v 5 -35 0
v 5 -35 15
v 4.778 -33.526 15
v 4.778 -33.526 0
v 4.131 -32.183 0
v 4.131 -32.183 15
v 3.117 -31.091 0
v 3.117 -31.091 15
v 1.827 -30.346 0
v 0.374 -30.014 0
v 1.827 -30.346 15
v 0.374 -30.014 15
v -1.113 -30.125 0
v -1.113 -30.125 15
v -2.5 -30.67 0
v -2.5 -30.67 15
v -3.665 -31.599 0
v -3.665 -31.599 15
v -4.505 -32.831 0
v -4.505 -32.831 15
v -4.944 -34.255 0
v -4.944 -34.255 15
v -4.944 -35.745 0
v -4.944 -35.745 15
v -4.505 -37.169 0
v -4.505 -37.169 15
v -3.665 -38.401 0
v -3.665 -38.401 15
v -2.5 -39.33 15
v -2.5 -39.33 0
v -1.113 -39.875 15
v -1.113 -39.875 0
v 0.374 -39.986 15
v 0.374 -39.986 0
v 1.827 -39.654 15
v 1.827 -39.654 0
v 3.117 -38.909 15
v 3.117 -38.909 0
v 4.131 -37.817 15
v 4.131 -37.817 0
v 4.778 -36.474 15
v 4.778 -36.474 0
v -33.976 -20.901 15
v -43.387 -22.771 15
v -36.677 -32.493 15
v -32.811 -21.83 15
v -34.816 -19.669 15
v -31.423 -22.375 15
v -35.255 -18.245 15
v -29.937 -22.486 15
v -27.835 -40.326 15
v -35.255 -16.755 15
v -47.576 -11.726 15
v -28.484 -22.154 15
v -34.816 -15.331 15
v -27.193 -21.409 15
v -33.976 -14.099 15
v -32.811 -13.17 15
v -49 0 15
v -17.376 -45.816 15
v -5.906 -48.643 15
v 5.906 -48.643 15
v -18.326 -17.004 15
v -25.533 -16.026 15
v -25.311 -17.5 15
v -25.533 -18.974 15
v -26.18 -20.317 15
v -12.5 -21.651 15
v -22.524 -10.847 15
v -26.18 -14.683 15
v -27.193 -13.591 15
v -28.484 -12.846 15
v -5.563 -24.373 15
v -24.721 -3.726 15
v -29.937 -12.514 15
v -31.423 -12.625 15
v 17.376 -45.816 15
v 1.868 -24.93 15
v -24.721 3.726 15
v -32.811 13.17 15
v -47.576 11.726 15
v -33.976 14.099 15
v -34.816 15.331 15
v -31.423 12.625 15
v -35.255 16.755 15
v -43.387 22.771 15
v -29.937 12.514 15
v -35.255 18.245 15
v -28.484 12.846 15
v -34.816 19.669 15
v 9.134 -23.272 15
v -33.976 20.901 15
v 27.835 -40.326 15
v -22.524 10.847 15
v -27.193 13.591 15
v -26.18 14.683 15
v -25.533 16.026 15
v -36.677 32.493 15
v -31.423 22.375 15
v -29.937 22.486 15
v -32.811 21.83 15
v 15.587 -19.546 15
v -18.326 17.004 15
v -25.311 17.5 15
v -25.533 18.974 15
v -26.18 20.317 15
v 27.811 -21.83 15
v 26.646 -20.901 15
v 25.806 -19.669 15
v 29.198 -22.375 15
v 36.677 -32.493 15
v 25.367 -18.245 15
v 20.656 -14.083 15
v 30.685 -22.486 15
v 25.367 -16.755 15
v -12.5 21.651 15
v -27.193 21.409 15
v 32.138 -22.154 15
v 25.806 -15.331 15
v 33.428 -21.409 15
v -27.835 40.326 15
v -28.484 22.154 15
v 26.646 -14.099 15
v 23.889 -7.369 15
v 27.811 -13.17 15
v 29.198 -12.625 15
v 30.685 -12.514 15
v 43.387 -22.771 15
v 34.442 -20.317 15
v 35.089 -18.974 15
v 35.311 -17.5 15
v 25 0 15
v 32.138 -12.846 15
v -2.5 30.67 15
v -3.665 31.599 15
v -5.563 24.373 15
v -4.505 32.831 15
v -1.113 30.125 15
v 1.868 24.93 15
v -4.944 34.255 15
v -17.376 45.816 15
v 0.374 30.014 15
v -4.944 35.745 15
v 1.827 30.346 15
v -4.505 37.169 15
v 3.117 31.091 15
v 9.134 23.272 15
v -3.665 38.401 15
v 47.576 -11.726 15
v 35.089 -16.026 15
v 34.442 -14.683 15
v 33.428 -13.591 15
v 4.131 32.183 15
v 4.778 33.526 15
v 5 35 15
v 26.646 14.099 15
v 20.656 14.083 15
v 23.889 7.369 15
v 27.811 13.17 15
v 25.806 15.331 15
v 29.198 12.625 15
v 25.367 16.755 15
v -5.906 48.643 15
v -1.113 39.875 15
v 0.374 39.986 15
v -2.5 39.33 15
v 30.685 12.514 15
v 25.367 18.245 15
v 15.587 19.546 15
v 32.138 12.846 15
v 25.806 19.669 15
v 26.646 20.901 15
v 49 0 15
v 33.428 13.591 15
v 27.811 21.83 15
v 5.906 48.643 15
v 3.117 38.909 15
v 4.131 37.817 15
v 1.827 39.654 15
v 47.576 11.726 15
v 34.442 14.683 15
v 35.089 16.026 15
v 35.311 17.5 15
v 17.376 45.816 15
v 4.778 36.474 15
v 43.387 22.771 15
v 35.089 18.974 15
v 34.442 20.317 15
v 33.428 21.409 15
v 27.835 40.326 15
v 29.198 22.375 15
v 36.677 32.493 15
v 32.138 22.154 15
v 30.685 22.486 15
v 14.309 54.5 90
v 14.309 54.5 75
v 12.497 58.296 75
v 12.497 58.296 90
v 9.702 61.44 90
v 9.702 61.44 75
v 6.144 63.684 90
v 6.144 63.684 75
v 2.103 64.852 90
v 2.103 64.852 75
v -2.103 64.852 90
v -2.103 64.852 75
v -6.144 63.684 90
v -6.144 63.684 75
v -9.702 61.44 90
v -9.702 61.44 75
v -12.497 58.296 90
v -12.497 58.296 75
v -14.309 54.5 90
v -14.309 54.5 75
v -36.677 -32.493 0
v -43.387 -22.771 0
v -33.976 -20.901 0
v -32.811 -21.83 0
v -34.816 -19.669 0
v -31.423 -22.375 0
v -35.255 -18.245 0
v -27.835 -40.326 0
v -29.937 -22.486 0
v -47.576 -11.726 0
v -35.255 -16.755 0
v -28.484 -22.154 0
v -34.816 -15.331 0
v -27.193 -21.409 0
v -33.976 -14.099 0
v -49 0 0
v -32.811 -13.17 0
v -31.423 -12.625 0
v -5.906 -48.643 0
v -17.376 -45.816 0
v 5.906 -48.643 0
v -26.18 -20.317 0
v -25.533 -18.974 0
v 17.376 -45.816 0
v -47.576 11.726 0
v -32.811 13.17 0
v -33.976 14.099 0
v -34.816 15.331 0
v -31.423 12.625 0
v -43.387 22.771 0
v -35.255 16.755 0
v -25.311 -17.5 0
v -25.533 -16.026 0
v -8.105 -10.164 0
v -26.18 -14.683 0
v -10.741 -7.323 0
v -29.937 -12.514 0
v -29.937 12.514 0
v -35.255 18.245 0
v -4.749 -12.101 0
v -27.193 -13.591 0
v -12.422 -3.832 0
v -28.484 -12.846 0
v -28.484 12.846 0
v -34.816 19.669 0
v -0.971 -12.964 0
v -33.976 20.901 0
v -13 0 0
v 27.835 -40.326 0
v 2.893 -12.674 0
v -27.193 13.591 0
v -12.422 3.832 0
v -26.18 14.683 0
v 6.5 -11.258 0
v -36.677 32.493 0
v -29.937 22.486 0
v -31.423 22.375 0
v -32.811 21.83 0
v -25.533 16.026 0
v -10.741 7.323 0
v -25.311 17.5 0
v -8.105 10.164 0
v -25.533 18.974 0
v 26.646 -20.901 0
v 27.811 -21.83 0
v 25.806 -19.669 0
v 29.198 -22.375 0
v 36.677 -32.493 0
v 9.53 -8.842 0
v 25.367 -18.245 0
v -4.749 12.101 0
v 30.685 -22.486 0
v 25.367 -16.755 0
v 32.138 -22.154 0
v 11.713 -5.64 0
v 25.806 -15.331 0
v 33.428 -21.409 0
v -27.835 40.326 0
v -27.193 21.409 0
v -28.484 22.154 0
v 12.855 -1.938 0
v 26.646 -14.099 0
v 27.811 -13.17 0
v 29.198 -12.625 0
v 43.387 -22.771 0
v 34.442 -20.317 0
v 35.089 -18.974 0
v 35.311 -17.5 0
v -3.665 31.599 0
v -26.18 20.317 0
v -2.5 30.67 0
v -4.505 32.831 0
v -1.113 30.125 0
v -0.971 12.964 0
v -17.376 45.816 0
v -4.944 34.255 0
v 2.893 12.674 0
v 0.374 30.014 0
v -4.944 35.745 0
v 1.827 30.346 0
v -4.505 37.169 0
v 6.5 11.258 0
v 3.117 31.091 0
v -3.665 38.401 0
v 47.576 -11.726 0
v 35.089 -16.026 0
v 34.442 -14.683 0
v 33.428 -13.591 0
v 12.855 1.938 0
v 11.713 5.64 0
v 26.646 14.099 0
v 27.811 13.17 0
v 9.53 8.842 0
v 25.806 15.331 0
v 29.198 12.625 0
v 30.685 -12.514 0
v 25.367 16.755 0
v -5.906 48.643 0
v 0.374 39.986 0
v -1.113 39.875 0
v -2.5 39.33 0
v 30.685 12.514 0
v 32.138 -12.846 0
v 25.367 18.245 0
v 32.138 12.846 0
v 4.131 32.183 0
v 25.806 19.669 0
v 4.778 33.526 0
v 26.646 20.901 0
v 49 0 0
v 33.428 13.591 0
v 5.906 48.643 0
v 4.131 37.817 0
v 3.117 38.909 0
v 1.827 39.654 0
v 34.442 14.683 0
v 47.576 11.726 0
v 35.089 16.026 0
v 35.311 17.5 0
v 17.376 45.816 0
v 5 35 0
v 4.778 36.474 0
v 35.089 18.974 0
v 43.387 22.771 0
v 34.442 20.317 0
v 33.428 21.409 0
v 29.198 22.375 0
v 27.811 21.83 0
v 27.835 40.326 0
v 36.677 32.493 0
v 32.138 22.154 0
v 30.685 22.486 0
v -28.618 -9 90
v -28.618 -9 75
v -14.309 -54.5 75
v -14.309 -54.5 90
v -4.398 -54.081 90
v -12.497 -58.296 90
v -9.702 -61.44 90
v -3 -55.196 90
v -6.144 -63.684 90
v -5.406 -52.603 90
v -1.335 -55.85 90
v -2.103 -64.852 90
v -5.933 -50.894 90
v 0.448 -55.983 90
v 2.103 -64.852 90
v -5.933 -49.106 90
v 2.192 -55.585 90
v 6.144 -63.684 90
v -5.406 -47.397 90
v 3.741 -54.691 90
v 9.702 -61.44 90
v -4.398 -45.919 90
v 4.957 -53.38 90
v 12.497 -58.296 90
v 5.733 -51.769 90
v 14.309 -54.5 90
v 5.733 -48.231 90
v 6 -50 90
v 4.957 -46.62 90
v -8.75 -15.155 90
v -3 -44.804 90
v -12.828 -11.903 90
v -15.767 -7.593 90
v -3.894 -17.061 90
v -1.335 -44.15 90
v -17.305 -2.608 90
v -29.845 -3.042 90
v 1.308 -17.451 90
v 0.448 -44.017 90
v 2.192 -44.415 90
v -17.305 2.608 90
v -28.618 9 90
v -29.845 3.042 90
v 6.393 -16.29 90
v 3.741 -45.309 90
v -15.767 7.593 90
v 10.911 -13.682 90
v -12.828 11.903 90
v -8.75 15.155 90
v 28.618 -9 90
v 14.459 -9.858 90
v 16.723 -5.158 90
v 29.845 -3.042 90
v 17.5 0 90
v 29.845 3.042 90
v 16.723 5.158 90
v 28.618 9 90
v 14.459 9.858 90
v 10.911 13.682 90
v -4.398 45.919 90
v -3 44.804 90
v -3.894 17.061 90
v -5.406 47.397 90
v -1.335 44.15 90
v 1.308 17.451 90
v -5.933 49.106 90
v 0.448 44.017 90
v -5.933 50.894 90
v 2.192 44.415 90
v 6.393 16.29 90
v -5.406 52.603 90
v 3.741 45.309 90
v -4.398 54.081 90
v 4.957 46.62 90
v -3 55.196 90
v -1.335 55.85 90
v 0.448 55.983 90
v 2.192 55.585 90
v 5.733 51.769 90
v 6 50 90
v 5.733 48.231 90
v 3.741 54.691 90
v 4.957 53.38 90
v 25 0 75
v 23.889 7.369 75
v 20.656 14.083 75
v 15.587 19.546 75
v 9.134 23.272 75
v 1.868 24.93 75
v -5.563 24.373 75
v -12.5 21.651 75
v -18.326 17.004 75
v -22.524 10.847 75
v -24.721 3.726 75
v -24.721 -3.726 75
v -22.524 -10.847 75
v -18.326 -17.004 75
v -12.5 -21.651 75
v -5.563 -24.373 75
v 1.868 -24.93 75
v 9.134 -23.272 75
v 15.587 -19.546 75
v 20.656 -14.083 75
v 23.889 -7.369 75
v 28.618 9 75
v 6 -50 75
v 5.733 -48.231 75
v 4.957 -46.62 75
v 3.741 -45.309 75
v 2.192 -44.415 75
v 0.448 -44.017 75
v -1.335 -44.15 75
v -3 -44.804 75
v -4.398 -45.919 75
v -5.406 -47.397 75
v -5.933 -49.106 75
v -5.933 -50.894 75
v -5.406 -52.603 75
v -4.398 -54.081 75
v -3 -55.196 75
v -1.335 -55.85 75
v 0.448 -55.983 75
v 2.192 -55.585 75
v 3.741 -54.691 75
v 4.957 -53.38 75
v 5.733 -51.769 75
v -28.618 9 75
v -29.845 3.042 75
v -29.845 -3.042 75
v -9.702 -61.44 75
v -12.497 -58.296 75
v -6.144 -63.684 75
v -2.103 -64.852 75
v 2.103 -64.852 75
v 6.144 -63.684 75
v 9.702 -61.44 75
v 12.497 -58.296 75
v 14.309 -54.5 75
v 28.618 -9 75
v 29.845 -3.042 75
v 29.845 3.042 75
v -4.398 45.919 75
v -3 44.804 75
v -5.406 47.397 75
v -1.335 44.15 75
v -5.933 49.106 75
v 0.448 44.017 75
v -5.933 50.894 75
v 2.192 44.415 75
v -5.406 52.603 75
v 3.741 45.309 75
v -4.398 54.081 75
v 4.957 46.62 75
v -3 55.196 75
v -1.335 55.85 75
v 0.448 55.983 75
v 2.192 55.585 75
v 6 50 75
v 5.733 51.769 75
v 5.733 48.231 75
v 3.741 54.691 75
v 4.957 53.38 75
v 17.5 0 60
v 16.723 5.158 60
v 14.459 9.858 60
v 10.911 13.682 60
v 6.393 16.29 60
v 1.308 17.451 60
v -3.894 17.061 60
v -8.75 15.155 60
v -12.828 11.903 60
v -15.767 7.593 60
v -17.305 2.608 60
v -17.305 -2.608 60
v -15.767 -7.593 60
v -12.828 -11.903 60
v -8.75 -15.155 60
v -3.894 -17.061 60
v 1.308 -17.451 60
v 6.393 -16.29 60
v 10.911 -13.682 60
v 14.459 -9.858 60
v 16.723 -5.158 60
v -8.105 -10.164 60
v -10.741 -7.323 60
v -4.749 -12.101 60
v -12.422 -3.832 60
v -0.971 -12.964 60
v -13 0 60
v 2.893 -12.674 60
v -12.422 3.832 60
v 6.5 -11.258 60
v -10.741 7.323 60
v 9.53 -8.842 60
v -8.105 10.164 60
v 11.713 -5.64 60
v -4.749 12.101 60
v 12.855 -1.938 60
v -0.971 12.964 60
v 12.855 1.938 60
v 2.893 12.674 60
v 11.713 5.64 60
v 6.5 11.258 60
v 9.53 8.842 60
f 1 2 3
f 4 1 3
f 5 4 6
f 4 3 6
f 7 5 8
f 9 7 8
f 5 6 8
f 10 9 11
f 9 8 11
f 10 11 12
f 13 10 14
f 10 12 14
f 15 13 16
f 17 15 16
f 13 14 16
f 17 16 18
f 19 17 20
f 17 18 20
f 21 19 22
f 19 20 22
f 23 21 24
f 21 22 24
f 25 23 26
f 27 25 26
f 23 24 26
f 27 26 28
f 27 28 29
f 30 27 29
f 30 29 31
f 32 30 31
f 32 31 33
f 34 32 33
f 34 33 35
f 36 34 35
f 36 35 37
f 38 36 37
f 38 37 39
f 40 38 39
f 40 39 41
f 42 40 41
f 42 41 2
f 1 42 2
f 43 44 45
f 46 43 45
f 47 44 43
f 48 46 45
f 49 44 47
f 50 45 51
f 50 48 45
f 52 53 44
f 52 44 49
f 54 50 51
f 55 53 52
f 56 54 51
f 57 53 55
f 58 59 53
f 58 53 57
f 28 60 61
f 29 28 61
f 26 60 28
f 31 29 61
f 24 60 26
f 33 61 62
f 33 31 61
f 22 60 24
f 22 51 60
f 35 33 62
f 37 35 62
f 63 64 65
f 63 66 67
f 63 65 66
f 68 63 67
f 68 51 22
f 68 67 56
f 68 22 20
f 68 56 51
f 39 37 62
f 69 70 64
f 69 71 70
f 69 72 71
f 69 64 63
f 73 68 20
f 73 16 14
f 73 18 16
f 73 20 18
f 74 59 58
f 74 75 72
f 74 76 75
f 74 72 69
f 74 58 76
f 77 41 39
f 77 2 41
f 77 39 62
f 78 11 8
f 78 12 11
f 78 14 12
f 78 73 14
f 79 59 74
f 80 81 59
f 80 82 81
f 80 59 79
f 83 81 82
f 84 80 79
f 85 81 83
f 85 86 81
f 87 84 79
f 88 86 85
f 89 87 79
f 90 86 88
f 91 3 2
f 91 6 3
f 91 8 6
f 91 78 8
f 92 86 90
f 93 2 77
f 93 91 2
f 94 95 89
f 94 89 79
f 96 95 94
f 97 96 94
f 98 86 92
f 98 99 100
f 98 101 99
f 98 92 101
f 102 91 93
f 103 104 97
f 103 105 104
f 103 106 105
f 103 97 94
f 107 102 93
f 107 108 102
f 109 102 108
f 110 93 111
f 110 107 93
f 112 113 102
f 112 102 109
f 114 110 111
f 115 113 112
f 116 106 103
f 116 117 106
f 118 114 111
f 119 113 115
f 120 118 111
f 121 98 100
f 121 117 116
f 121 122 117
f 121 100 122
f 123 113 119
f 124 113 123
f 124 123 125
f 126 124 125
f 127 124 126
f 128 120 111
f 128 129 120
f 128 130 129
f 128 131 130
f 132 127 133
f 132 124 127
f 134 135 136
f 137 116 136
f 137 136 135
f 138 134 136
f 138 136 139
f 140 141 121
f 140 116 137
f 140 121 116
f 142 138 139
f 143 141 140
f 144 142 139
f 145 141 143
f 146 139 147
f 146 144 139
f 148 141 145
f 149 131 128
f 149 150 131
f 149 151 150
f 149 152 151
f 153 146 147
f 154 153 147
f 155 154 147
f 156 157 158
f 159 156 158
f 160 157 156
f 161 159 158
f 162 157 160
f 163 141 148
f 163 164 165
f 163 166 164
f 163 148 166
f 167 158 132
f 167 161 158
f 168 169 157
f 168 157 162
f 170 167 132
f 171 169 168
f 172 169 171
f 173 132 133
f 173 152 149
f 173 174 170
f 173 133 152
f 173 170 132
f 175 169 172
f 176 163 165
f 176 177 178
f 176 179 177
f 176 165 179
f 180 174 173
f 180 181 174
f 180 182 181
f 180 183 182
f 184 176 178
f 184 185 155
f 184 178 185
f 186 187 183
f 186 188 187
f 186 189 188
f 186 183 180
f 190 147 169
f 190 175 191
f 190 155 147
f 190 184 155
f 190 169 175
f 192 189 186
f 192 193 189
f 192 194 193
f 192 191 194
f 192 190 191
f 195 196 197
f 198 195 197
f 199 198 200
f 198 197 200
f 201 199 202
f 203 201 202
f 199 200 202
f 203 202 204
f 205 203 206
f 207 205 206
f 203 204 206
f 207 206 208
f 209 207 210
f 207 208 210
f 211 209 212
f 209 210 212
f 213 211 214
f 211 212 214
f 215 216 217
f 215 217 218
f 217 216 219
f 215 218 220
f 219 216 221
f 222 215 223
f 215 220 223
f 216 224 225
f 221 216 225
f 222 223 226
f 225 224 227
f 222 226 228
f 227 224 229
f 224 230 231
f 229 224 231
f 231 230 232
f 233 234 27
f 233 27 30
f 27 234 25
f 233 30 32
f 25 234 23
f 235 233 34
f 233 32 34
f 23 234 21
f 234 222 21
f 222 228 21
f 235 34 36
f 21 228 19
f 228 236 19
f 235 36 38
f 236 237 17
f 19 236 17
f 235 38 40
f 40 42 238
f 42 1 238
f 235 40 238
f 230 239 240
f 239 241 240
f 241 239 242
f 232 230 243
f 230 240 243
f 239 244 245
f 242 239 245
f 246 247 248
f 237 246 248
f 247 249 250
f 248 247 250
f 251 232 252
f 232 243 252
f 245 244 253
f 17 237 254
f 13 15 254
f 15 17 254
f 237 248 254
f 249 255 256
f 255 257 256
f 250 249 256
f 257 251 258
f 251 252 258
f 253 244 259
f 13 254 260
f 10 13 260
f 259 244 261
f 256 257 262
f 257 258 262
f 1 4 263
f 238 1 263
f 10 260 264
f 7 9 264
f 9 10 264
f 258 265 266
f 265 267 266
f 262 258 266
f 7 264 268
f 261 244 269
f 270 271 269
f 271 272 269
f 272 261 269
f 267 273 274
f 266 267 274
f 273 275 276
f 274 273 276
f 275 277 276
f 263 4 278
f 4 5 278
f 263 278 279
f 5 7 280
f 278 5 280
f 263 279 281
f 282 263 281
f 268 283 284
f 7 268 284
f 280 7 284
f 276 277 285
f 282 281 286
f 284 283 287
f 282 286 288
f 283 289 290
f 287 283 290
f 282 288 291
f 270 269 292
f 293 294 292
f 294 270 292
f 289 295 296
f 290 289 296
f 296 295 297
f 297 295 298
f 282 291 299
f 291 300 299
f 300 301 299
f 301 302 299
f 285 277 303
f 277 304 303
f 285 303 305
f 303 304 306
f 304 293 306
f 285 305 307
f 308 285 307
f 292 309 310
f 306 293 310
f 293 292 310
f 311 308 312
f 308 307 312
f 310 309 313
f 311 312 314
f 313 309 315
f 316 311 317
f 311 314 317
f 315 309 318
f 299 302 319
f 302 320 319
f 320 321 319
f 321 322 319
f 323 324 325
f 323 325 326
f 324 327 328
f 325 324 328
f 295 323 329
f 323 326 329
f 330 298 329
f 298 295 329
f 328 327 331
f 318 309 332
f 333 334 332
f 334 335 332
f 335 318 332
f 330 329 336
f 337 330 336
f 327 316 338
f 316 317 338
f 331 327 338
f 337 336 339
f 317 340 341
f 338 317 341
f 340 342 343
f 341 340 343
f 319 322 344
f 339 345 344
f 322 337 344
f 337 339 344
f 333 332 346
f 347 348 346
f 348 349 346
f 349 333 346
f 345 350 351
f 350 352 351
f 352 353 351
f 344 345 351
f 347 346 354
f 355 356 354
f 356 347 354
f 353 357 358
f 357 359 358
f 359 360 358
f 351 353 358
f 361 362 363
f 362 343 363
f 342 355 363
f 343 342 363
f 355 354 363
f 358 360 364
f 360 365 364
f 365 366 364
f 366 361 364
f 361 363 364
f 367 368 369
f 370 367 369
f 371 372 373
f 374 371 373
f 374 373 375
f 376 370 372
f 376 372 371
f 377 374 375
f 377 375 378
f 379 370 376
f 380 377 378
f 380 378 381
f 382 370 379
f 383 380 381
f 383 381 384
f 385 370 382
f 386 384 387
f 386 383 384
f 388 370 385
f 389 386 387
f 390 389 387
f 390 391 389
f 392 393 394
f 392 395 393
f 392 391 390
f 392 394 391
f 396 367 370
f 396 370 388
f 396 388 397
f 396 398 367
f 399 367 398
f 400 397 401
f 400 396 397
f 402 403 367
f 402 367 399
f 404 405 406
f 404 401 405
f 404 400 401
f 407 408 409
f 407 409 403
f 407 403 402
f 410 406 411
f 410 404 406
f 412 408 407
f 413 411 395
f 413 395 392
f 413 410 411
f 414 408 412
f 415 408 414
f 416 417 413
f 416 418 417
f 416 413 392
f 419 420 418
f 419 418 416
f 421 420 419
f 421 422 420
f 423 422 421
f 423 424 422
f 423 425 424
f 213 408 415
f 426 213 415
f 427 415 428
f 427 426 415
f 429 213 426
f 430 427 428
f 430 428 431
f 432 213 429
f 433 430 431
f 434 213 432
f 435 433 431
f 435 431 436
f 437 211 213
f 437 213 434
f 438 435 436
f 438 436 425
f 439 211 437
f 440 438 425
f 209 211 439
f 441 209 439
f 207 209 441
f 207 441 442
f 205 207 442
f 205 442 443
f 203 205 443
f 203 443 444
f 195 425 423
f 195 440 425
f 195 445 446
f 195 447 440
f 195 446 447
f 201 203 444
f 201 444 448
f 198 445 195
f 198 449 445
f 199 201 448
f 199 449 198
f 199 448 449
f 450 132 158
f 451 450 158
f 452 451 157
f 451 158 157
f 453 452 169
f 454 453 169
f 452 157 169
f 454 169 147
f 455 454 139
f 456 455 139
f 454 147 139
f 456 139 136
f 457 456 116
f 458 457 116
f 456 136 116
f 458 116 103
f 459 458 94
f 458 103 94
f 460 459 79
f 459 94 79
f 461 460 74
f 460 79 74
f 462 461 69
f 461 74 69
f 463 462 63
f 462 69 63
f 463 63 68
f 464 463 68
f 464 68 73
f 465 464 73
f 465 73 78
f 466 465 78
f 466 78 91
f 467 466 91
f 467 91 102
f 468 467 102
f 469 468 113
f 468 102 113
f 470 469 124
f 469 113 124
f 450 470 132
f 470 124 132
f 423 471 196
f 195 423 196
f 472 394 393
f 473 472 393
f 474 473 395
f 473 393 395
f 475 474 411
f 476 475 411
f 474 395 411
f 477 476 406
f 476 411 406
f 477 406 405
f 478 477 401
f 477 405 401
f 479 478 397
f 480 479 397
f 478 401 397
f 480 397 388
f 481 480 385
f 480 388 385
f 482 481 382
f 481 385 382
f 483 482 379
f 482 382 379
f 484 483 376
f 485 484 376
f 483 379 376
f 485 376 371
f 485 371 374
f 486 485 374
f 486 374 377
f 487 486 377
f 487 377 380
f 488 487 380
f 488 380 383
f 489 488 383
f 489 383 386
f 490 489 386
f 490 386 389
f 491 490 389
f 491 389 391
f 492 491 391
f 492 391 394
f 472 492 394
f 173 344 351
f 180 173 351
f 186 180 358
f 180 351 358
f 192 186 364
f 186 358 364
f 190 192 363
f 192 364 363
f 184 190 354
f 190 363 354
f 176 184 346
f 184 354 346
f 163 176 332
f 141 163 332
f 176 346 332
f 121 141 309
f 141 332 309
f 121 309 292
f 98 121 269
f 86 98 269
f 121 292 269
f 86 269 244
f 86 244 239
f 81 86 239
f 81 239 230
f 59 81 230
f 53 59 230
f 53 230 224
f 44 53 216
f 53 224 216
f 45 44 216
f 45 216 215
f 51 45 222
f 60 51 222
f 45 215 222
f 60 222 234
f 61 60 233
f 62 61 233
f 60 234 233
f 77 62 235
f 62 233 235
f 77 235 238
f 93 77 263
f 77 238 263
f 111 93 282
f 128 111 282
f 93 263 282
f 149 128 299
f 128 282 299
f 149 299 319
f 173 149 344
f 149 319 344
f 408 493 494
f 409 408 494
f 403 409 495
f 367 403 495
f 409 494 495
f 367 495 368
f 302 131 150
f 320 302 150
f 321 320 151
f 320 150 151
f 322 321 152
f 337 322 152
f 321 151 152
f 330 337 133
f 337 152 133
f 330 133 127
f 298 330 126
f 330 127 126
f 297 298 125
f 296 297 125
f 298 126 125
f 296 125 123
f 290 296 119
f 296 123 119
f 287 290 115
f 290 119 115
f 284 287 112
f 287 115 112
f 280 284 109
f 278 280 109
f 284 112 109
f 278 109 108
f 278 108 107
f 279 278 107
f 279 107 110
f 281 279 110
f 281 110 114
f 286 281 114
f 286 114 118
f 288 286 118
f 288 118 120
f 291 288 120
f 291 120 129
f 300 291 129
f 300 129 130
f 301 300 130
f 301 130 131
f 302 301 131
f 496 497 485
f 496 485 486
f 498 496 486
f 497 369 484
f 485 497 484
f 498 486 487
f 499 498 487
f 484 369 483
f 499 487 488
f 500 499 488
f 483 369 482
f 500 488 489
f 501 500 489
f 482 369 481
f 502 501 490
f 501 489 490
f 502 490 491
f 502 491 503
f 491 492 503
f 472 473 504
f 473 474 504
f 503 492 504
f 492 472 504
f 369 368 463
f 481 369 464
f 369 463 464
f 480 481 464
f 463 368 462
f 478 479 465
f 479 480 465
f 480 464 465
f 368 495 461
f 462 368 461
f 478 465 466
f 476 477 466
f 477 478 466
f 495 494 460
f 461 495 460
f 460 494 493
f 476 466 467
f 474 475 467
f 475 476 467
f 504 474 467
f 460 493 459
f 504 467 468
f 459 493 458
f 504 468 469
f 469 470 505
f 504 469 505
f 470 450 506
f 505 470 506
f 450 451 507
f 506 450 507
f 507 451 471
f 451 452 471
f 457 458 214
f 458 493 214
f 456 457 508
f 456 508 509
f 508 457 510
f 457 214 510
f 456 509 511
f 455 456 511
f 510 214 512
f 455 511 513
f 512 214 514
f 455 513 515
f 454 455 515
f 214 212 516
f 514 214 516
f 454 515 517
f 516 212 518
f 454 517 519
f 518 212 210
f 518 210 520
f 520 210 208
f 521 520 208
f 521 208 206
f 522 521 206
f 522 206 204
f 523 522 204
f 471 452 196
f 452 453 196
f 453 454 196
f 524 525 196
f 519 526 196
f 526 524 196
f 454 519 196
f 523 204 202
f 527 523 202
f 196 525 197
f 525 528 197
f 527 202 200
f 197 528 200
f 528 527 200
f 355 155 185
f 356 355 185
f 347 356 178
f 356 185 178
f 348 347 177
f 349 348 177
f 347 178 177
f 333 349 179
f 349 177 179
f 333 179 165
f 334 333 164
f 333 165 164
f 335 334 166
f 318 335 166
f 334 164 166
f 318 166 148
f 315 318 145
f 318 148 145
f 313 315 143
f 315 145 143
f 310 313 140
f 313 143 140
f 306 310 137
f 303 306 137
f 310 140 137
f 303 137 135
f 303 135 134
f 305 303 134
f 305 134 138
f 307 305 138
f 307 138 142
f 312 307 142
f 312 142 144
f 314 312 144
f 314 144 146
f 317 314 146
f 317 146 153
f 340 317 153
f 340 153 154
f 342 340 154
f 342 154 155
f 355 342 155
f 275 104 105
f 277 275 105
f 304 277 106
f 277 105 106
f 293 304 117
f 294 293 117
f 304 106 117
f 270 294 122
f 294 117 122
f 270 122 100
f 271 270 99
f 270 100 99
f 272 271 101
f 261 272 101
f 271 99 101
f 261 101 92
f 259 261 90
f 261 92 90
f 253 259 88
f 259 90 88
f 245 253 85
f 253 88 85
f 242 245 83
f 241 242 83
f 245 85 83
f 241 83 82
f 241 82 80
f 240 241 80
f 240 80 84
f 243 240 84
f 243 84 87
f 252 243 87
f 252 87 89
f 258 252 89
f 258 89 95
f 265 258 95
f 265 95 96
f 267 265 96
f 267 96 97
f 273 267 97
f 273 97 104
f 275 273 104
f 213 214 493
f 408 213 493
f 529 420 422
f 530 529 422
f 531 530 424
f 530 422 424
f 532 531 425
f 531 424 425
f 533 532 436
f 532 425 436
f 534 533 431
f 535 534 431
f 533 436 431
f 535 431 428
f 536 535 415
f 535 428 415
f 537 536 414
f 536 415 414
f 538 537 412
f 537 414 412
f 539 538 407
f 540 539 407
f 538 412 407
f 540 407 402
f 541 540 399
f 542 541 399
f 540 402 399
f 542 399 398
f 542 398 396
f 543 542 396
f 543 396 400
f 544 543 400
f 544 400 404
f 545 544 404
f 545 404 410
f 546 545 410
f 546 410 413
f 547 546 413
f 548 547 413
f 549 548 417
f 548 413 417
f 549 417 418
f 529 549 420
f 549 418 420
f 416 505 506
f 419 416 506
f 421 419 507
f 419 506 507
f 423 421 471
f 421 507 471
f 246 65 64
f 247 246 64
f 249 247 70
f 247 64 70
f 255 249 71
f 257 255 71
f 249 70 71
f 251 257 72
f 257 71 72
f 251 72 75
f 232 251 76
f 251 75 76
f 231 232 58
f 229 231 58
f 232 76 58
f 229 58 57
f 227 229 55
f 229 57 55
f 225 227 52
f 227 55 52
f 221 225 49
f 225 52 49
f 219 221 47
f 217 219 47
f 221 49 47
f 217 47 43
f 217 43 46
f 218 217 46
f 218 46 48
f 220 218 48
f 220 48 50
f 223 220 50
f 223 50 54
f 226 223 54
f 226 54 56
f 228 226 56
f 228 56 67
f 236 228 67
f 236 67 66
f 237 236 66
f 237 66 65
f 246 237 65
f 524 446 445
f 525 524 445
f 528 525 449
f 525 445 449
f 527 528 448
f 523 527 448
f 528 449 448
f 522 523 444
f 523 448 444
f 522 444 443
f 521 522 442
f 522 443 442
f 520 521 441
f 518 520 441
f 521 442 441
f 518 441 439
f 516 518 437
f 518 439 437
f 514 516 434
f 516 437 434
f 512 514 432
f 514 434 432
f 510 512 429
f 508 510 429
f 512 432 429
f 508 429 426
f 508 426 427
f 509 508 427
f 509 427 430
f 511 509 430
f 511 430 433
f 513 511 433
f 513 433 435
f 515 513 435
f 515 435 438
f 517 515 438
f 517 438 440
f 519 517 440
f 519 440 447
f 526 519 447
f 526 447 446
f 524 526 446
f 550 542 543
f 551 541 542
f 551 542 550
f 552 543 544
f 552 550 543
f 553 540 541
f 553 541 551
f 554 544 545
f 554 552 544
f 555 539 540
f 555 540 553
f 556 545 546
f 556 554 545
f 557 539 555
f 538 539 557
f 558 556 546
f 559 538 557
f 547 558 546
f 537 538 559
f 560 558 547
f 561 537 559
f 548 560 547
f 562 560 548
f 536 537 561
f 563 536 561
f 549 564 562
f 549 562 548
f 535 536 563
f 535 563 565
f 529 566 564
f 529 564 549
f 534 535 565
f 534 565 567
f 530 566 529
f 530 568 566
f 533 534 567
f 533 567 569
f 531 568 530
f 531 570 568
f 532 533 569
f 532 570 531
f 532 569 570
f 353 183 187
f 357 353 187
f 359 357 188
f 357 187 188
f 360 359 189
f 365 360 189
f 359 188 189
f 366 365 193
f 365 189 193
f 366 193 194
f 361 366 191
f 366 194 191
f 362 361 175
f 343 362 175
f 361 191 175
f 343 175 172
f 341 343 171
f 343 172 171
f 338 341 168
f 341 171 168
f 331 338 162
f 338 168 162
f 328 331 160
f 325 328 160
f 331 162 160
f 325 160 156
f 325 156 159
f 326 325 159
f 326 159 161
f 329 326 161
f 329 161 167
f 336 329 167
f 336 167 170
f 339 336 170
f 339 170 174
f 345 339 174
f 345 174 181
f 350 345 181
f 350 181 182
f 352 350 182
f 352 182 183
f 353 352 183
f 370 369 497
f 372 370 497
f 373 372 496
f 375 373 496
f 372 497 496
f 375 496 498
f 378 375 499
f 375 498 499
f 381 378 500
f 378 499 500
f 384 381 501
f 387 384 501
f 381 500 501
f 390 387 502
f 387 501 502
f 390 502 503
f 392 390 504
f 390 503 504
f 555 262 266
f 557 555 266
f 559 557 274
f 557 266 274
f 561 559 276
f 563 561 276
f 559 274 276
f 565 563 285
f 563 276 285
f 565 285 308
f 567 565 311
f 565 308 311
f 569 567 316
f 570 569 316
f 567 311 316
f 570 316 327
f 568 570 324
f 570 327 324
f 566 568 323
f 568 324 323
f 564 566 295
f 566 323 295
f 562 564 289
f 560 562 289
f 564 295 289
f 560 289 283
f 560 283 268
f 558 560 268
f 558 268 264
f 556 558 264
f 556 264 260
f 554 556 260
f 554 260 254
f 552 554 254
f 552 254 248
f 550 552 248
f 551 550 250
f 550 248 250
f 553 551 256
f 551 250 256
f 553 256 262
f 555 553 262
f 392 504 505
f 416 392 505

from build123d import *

# Parameters (mm, degrees)
SKETCH1_R           = 49
BOSS_EXTRUDE1_DEPTH = 15
SKETCH7_R           = 5
CUT_EXTRUDE1_DEPTH  = 71.901339903
SKETCH8_R           = 25
BOSS_EXTRUDE2_DEPTH = 60
BOSS_EXTRUDE3_DEPTH = 15
SKETCH11_R          = 6
CUT_EXTRUDE3_DEPTH  = 33
SKETCH11_3_R        = 6
SKETCH11_3_R_2      = 17.5
CUT_EXTRUDE4_DEPTH  = 30
SKETCH12_R          = 13
CUT_EXTRUDE5_DEPTH  = 60


with BuildPart() as part:
    # Sketch1 → Boss-Extrude1 (new body)
    with BuildSketch(Plane.XY):
        Circle(SKETCH1_R)
    extrude(amount=BOSS_EXTRUDE1_DEPTH)

    # Sketch7 → Cut-Extrude1 (cut, through all)
    with BuildSketch(Plane.XY.offset(15)):
        with Locations((0, 35)):
            Circle(SKETCH7_R)
        with Locations((30.310889132, 17.5)):
            Circle(SKETCH7_R)
        with Locations((30.310889132, -17.5)):
            Circle(SKETCH7_R)
        with Locations((0, -35)):
            Circle(SKETCH7_R)
        with Locations((-30.310889132, -17.5)):
            Circle(SKETCH7_R)
        with Locations((-30.310889132, 17.5)):
            Circle(SKETCH7_R)
    extrude(amount=-CUT_EXTRUDE1_DEPTH, mode=Mode.SUBTRACT)

    # Sketch8 → Boss-Extrude2 (add)
    with BuildSketch(Plane.XY.offset(15)):
        Circle(SKETCH8_R)
    extrude(amount=BOSS_EXTRUDE2_DEPTH)

    # Sketch10 → Boss-Extrude3 (add)
    with BuildSketch(Plane.XY.offset(75)):
        with BuildLine():
            Line((14.309088021, -54.5), (28.618175991, -9.000000163))
            ThreePointArc((28.618175991, -9.000000163), (30, -8.5e-08), (28.618176043, 9))
            Line((28.618176043, 9), (14.309088021, 54.5))
            ThreePointArc((14.309088021, 54.5), (0, 65), (-14.309088021, 54.5))
            Line((-14.309088021, 54.5), (-28.618176043, 9))
            ThreePointArc((-28.618176043, 9), (-30, 0), (-28.618176043, -9))
            Line((-28.618176043, -9), (-14.309088021, -54.5))
            ThreePointArc((-14.309088021, -54.5), (0, -65), (14.309088021, -54.5))
        make_face()
    extrude(amount=BOSS_EXTRUDE3_DEPTH)

    # Sketch11 → Cut-Extrude3 (cut)
    with BuildSketch(Plane.XY.offset(90)):
        with Locations((0, 50)):
            Circle(SKETCH11_R)
        with Locations((0, -50)):
            Circle(SKETCH11_R)
    extrude(amount=-CUT_EXTRUDE3_DEPTH, mode=Mode.SUBTRACT)

    # Sketch11<3> → Cut-Extrude4 (cut)
    with BuildSketch(Plane.XY.offset(90)):
        with Locations((0, 50)):
            Circle(SKETCH11_3_R)
        with Locations((0, -50)):
            Circle(SKETCH11_3_R)
        Circle(SKETCH11_3_R_2)
    extrude(amount=-CUT_EXTRUDE4_DEPTH, mode=Mode.SUBTRACT)

    # Sketch12 → Cut-Extrude5 (cut)
    with BuildSketch(Plane(origin=(0, 0, 0), x_dir=(-1, 0, 0), z_dir=(0, 0, -1))):
        Circle(SKETCH12_R)
    extrude(amount=-CUT_EXTRUDE5_DEPTH, mode=Mode.SUBTRACT)


solid = part.part
